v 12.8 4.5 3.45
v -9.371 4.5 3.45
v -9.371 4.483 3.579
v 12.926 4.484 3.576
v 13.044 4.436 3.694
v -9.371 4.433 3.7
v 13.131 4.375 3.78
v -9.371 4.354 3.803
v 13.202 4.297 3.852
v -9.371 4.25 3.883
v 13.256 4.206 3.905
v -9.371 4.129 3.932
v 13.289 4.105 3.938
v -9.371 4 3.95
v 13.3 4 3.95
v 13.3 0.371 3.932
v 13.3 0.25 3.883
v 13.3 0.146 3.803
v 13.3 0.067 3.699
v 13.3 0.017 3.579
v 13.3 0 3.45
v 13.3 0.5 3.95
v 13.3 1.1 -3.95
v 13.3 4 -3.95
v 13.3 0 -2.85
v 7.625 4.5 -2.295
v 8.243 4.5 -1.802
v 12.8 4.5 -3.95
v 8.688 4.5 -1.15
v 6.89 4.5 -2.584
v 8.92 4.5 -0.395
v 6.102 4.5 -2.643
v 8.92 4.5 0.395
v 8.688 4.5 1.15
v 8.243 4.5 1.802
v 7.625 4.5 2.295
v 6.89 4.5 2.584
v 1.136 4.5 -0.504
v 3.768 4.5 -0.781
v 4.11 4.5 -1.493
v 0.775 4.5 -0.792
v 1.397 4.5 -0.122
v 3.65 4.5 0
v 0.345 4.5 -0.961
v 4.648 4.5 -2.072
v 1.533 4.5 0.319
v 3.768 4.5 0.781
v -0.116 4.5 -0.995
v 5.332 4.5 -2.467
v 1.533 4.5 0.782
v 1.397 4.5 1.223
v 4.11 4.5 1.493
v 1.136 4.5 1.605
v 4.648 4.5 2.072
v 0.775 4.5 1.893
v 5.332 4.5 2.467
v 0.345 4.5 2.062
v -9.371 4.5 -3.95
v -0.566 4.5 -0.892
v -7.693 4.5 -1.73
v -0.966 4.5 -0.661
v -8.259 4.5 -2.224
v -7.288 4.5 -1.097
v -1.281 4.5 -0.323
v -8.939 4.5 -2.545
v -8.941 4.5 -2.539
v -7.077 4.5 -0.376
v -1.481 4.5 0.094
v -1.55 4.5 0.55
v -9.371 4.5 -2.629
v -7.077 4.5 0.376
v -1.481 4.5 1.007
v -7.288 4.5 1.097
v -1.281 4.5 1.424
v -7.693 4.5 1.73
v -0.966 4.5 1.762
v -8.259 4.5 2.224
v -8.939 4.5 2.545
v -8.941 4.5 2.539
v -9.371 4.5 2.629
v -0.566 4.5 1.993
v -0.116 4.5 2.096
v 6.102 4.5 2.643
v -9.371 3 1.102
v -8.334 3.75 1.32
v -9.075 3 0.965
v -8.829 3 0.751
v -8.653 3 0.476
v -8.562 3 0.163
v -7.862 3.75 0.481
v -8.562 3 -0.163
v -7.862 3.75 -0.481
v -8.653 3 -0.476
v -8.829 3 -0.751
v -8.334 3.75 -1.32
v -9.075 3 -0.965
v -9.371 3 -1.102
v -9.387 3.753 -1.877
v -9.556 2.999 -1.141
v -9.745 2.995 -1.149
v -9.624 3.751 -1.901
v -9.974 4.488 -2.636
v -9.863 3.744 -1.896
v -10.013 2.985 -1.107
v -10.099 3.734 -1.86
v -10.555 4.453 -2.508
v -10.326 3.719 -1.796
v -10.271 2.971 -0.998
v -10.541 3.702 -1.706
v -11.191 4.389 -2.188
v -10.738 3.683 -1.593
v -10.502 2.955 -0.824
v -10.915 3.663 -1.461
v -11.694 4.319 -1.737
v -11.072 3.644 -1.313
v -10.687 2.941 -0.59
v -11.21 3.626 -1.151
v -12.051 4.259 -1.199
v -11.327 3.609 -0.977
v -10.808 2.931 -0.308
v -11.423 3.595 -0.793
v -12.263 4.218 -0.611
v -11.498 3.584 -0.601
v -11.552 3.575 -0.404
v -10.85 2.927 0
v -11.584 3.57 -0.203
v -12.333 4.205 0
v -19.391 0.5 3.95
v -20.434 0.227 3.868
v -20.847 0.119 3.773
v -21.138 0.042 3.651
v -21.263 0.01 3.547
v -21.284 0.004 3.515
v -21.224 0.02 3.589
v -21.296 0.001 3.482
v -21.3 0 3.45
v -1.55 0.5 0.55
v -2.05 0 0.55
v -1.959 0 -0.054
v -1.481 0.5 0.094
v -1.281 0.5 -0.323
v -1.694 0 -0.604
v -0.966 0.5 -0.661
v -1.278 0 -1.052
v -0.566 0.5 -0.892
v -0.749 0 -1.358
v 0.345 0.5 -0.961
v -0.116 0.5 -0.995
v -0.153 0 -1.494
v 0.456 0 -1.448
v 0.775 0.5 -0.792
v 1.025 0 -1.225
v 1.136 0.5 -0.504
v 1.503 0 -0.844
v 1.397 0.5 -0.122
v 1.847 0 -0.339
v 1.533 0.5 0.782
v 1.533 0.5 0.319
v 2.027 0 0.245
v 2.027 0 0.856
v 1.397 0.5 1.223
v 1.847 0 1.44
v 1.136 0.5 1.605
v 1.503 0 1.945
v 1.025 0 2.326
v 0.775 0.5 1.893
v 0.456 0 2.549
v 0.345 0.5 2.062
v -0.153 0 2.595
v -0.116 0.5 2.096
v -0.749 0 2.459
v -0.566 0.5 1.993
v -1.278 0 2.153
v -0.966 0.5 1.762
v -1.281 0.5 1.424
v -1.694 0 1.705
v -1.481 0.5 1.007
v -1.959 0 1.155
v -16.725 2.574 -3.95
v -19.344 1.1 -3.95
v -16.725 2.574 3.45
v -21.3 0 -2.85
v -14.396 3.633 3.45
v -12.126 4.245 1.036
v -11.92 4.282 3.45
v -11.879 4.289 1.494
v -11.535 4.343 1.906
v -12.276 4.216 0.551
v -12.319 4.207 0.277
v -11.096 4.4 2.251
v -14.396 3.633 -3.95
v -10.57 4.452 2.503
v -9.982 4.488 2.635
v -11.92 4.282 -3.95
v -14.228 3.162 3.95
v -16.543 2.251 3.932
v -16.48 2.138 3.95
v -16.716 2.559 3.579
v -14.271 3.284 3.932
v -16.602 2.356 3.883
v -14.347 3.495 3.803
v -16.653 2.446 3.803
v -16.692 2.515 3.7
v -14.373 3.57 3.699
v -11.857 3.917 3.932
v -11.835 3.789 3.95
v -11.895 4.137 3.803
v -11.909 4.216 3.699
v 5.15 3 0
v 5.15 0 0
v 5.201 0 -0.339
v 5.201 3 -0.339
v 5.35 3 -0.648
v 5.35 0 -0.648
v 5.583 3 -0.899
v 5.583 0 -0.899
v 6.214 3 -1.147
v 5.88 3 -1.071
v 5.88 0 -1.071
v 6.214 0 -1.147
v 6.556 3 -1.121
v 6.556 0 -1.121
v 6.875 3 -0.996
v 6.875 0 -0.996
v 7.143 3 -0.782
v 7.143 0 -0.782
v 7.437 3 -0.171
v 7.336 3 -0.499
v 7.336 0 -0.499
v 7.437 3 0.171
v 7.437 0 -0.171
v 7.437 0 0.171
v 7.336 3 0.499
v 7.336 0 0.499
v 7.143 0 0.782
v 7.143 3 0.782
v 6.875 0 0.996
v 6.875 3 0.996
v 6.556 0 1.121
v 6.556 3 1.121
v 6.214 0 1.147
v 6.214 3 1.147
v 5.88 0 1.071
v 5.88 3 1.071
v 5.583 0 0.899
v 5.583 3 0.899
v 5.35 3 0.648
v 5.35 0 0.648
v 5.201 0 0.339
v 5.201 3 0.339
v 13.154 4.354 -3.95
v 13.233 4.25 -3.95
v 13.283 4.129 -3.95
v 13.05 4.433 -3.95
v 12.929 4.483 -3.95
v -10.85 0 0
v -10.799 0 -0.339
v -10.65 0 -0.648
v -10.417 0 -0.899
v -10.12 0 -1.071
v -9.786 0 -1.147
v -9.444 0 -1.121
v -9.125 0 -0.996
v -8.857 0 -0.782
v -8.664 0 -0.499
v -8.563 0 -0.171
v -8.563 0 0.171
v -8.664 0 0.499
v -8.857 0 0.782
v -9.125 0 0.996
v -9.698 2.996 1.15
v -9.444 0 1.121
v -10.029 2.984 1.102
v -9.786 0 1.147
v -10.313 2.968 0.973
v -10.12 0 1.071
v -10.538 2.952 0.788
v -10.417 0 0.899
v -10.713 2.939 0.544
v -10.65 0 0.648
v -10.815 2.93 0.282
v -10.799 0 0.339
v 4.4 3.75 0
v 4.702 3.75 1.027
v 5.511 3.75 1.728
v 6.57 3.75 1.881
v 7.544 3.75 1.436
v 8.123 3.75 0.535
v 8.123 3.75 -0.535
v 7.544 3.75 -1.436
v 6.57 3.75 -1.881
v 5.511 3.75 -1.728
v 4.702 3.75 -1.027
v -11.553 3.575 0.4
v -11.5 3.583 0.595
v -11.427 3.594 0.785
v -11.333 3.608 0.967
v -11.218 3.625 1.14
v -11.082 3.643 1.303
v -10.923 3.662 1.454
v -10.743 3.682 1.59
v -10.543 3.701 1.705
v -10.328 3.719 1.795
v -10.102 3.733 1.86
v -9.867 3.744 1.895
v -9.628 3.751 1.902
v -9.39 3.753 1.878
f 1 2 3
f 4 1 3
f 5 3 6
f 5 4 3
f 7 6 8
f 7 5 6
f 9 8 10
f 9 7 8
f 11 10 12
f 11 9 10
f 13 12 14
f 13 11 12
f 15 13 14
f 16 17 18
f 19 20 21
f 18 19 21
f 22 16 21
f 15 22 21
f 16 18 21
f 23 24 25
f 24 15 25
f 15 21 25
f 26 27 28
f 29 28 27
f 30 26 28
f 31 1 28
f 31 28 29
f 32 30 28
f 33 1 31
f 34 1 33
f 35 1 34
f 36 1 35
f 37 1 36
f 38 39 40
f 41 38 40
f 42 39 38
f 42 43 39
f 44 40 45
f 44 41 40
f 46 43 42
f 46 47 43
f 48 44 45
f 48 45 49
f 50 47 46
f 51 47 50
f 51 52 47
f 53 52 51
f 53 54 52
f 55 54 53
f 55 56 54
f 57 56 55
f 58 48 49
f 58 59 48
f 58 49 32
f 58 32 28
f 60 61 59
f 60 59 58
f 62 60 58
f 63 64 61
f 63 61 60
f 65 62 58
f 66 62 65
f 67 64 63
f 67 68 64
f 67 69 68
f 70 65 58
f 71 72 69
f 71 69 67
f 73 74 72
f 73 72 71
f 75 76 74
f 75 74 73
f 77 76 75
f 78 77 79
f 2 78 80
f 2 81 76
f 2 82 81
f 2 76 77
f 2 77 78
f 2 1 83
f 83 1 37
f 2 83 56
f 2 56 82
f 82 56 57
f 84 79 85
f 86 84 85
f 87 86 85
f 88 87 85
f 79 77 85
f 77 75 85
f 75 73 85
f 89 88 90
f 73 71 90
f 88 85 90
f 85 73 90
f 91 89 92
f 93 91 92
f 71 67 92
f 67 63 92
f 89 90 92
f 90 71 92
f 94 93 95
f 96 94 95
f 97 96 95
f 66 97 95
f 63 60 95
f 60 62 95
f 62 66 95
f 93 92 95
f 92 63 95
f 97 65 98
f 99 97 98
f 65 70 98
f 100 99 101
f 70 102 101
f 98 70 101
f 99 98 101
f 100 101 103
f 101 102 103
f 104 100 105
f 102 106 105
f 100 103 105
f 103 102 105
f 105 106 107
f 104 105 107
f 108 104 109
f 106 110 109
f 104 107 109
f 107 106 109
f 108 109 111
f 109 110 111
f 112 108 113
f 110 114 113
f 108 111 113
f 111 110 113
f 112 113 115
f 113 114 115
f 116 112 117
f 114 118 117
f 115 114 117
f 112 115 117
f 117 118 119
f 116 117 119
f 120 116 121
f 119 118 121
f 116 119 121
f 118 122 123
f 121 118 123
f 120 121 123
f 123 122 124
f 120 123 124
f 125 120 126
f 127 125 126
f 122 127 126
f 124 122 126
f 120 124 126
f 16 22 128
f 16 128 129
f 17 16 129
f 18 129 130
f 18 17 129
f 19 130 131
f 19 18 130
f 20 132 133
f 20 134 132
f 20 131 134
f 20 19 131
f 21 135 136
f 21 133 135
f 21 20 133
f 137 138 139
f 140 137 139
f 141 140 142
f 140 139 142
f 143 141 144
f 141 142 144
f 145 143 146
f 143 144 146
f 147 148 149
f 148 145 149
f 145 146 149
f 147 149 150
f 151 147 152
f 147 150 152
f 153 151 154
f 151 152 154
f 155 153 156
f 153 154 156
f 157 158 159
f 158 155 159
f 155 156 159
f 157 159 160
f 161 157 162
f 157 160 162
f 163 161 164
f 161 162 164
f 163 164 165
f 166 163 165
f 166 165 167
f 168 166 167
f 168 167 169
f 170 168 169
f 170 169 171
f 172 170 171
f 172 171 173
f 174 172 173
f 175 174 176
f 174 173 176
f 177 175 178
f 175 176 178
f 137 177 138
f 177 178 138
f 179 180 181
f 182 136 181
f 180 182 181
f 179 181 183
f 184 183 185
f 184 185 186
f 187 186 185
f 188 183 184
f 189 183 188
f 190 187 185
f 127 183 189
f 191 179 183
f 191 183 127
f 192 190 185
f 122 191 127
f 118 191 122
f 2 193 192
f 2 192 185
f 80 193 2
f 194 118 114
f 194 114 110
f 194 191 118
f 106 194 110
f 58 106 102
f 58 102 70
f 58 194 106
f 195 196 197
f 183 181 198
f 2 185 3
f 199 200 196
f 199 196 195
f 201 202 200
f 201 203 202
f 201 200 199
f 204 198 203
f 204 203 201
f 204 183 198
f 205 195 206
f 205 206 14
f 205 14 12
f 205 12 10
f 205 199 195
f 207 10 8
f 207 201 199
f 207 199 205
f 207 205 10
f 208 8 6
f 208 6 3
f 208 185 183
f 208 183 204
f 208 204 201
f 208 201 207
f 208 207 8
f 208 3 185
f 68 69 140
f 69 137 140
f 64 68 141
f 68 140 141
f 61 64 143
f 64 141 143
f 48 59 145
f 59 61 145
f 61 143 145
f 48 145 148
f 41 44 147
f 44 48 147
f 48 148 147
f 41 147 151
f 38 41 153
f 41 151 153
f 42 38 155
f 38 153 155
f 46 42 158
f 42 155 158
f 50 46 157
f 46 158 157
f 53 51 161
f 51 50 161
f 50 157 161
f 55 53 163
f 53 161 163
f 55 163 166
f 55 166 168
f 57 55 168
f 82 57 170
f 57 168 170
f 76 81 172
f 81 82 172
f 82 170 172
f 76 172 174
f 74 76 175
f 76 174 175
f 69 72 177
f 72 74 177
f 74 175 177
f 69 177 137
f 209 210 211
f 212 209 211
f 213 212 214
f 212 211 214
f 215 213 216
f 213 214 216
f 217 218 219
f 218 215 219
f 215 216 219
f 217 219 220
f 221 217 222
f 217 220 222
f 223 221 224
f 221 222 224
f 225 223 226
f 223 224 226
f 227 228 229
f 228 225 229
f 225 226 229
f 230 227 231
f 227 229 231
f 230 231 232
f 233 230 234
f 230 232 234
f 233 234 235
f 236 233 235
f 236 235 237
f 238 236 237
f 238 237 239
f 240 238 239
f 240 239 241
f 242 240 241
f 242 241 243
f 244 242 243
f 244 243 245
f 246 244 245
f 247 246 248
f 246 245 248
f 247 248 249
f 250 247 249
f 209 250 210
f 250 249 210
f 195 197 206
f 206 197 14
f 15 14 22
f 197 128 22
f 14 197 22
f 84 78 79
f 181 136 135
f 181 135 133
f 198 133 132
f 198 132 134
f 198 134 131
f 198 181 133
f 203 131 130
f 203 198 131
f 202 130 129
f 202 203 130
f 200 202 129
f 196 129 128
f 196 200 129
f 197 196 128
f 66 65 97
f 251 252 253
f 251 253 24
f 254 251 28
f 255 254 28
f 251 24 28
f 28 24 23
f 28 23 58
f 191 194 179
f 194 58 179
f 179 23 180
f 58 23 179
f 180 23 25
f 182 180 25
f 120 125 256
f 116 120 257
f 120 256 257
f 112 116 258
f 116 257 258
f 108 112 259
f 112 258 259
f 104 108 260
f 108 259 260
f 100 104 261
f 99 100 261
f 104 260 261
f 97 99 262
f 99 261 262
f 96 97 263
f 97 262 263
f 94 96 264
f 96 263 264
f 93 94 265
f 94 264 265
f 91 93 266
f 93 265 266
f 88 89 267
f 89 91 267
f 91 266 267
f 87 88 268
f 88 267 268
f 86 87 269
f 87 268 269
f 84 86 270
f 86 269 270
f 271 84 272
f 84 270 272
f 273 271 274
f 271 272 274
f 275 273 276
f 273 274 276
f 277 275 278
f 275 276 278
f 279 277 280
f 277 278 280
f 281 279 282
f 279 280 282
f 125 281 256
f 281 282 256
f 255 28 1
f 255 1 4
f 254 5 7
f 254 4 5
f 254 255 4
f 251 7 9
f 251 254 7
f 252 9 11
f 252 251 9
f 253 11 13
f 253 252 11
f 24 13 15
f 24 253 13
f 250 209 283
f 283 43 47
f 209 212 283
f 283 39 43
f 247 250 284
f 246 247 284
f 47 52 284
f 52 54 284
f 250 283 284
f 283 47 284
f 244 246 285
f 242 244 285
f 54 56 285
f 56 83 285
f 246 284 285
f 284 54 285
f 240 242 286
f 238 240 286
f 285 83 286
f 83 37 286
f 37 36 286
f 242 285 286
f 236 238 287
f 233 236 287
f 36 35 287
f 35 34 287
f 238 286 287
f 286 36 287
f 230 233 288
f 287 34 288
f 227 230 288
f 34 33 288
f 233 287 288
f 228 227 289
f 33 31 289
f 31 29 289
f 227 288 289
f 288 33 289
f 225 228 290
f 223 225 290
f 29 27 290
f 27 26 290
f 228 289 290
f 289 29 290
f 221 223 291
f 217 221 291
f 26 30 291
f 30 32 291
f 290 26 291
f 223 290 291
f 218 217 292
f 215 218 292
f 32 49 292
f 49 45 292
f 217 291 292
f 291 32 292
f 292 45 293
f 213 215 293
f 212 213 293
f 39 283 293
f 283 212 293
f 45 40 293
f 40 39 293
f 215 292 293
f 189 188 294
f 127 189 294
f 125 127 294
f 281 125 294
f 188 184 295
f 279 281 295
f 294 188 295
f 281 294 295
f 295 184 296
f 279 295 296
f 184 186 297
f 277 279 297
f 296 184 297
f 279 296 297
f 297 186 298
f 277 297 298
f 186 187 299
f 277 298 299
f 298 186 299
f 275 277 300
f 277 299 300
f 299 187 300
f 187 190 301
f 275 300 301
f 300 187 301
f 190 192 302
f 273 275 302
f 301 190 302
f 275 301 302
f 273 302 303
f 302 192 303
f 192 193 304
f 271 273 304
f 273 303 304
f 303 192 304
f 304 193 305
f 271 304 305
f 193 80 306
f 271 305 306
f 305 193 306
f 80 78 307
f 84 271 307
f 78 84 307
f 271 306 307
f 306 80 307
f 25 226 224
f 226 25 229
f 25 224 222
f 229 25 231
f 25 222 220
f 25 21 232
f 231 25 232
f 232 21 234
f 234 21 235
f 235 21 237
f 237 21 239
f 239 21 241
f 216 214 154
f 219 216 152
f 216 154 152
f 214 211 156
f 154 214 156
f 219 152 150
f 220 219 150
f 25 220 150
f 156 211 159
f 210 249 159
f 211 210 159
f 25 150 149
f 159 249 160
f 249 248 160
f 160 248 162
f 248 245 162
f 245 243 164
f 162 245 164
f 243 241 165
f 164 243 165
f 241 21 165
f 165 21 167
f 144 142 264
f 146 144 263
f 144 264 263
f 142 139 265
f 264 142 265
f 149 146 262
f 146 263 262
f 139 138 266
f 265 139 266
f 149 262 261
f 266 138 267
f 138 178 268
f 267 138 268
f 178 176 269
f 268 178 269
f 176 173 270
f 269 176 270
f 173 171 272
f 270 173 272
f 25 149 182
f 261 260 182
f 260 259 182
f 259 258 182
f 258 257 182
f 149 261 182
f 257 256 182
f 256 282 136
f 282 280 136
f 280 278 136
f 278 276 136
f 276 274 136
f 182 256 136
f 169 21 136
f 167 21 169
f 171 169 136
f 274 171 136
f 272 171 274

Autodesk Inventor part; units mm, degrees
ref_plane "YZ Plane" through (0, 0, 0) normal (1, 0, 0) x (0, 1, 0)
ref_plane "XZ Plane" through (0, 0, 0) normal (0, 1, 0) x (-1, 0, 0)
ref_plane "XY Plane" through (0, 0, 0) normal (0, 0, 1) x (1, 0, 0)
sketch "Эскиз1" plane through (0, 0, 0) normal (0, 1, 0) x (-1, 0, 0)
  line L0 (-13.3, -3.9495) -> (13.3, -3.9495)
  line L1 (13.3, -3.9495) -> (13.3, 3.9495)
  line L2 (13.3, 3.9495) -> (-13.3, 3.9495)
  line L3 (-13.3, 3.9495) -> (-13.3, -3.9495)
  line L4 (-13.3, -3.9495) -> (13.3, 3.9495) construction
  line L5 (13.3, -3.9495) -> (-13.3, 3.9495) construction
  line L6 (0, 3.9495) -> (0, -3.9495) construction
  circle A0 centre (0, 0.5505) radius 1.55
  circle A1 centre (-6.3, 0) radius 1.15
  circle A2 centre (9.7, 0) radius 1.15
  point P0 (0, 0)
  dimension "d0" = 13.3
  dimension "d1" = 7.899
  dimension "d2" = 3.1
  dimension "d3" = 4.5
  dimension "d35" = 2.3
  dimension "d36" = 2.3
  dimension "d37" = 7
  dimension "d38" = 16
  dimension "d39" = 3.9495
  dimension "d40" = 3.9495
extrude "Выдавливание1" add sketch "Эскиз1" along normal blind 4.5
sketch "Эскиз4" plane through (-13.3, 0, 3.9495) normal (0, 0, 1) x (1, 0, 0)
  line L0 (0, 0) -> (0, 4.5) projected
  line L1 (0, 0) -> (-8, 0)
  line L2 (0, 4.5) -> (26.6, 4.5) projected
  line L3 (-8, 0) -> (0, 4.5)
  point P0 (13.3, 0)
  point P1 (25.6, 4.5)
  point P2 (3.9103, 4.5)
  dimension "d19" = 8
extrude "Выдавливание4" add sketch "Эскиз4" against normal blind 7.899
fillet "Сопряжение4" radius 15 1 edges at (-13.3, 4.5, 0)
chamfer "Фаска2" distance 0.5 angle 45 1 edges at (1.55, 0, 0.5505)
chamfer "Фаска3" distance 1.1 angle 45 1 edges at (-4, 0, -3.9495)
fillet "Сопряжение7" radius 0.5 5 edges at (-4, 0, 3.9495) (-19.0123, 1.2868, 3.9495) (-13.1718, 4.0104, 3.9495) (1.9646, 4.5, 3.9495) (13.3, 4.5, 0)
chamfer "Фаска4" distance 1.5 angle 45 4 edges at (-8.55, 4.5, 0) (-10.4551, 4.4608, -0.8673) (-10.4603, 4.4604, 0.8628) (7.45, 4.5, 0)
equation "\"d39\" = 0.5 * d1"
equation "\"d40\" = d39"
properties part number "derz_LED"
